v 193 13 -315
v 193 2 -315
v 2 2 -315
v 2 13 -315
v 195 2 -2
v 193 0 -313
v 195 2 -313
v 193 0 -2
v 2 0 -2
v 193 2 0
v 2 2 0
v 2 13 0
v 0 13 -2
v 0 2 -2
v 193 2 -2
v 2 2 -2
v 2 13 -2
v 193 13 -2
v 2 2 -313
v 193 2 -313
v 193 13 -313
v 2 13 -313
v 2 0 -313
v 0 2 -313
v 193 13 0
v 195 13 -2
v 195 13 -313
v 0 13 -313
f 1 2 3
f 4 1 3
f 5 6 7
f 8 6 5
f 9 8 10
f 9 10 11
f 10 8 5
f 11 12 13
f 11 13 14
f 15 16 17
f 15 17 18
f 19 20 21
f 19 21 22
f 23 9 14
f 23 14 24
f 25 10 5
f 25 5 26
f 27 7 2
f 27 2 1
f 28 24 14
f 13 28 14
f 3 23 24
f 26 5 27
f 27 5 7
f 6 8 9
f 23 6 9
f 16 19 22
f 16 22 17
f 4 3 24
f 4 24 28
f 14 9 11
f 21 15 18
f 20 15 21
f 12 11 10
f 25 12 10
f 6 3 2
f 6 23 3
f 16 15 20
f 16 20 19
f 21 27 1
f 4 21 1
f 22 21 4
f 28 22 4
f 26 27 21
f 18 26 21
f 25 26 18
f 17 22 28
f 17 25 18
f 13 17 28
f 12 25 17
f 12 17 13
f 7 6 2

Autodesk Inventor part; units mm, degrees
ref_plane "YZ Plane" through (0, 0, 0) normal (1, 0, 0) x (0, 1, 0)
ref_plane "XZ Plane" through (0, 0, 0) normal (0, 1, 0) x (-1, 0, 0)
ref_plane "XY Plane" through (0, 0, 0) normal (0, 0, 1) x (1, 0, 0)
sketch "草图1" plane through (0, 0, 0) normal (0, 1, 0) x (-1, 0, 0)
  line L0 (0, 0) -> (-195, 0)
  line L1 (-195, 0) -> (-195, -315)
  line L2 (-195, -315) -> (0, -315)
  line L3 (0, -315) -> (0, 0)
  dimension "d0" = 195
  dimension "d1" = 315
extrude "拉伸1" add sketch "草图1" along normal blind 13
shell "抽壳1" thickness 2 removed faces 1 at (65, 13, -210)
chamfer "倒角1" distance 2 angle 45 8 edges at (97.5, 0, 0) (0, 0, -157.5) (195, 0, -157.5) (97.5, 0, -315) (195, 6.5, -315) (195, 6.5, 0) (0, 6.5, 0) (0, 6.5, -315)
properties part number "test"
